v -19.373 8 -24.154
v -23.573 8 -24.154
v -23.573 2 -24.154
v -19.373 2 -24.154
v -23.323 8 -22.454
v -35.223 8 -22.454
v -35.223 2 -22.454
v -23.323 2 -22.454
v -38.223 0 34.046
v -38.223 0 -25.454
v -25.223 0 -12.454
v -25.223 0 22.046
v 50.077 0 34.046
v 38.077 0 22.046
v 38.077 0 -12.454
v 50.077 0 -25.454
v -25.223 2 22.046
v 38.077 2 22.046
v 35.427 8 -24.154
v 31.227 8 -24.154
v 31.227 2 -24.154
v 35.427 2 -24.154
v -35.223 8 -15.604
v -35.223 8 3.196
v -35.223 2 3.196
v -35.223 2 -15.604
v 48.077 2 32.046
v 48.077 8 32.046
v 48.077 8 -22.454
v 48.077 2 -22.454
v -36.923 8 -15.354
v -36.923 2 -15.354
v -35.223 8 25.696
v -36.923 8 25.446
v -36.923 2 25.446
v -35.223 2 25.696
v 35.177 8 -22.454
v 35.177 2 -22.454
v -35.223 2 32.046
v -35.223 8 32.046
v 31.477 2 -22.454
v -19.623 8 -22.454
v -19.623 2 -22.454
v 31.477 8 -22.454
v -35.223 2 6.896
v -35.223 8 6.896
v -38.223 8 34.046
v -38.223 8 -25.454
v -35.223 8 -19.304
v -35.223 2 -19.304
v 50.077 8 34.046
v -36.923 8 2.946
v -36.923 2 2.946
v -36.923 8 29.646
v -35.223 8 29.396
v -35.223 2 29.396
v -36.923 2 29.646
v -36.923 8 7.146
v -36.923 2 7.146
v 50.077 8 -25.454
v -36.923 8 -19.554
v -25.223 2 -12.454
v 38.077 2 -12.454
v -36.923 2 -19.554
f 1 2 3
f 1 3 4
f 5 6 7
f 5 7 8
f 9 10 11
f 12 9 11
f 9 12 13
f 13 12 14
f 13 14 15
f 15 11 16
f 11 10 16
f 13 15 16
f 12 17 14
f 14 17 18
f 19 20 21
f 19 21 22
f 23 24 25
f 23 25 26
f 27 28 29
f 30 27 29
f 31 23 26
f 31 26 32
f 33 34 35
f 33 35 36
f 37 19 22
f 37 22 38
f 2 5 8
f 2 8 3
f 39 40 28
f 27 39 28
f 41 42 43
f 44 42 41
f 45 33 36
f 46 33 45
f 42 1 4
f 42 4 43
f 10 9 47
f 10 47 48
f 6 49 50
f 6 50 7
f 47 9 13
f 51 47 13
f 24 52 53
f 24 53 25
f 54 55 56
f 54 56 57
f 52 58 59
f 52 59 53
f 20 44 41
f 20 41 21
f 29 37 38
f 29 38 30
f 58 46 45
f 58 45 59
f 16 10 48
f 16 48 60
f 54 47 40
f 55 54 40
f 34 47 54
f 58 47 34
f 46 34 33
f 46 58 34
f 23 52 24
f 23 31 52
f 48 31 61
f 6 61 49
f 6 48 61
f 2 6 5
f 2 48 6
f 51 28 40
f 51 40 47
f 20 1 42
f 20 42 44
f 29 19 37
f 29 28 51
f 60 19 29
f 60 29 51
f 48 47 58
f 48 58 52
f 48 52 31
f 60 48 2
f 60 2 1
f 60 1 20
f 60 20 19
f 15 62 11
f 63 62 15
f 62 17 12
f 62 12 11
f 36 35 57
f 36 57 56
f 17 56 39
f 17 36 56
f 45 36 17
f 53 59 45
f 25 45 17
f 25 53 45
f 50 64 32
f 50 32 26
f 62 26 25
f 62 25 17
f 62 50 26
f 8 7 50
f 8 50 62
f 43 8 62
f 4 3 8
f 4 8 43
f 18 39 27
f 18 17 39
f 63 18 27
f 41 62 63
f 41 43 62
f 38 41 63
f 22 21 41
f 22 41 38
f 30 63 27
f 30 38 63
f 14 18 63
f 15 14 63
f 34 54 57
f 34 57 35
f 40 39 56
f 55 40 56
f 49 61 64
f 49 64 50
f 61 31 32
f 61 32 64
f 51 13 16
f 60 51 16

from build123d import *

# Parameters (mm, degrees)
SKETCH1_W           = 88.3
SKETCH1_H           = 59.5
BOSS_EXTRUDE1_DEPTH = 8
SKETCH2_W           = 83.3
SKETCH2_H           = 54.5
CUT_EXTRUDE1_DEPTH  = 6
CUT_EXTRUDE2_DEPTH  = 6
SKETCH4_W           = 63.3
SKETCH4_H           = 34.5
CUT_EXTRUDE3_DEPTH  = 3


with BuildPart() as part:
    # Sketch1 → Boss-Extrude1 (new body)
    with BuildSketch(Plane(origin=(0, 0, 0), x_dir=(1, 0, 0), z_dir=(0, 1, 0))):
        with Locations((5.926671878, -4.296406043)):
            Rectangle(SKETCH1_W, SKETCH1_H)
    extrude(amount=BOSS_EXTRUDE1_DEPTH)

    # Sketch2 → Cut-Extrude1 (cut)
    with BuildSketch(Plane(origin=(0, 8, 0), x_dir=(1, 0, 0), z_dir=(0, 1, 0))):
        with Locations((6.426671878, -4.796406043)):
            Rectangle(SKETCH2_W, SKETCH2_H)
    extrude(amount=-CUT_EXTRUDE1_DEPTH, mode=Mode.SUBTRACT)

    # Sketch3 → Cut-Extrude2 (cut)
    with BuildSketch(Plane(origin=(0, 8, 0), x_dir=(1, 0, 0), z_dir=(0, 1, 0))):
        Polygon((-35.223328122, -29.396406043), (-36.923328122, -29.646406043), (-36.923328122, -25.446406043), (-35.223328122, -25.696406043), align=None)
        Polygon((-35.223328122, -6.896406043), (-36.923328122, -7.146406043), (-36.923328122, -2.946406043), (-35.223328122, -3.196406043), align=None)
        Polygon((-35.223328122, 15.603593957), (-36.923328122, 15.353593957), (-36.923328122, 19.553593957), (-35.223328122, 19.303593957), align=None)
        Polygon((35.176671878, 22.453593957), (31.476671878, 22.453593957), (31.226671878, 24.153593957), (35.426671878, 24.153593957), align=None)
        Polygon((-23.323328122, 22.453593957), (-23.573328122, 24.153593957), (-19.373328122, 24.153593957), (-19.623328122, 22.453593957), align=None)
    extrude(amount=-CUT_EXTRUDE2_DEPTH, mode=Mode.SUBTRACT)

    # Sketch4 → Cut-Extrude3 (cut, through all)
    with BuildSketch(Plane(origin=(0, 2, 0), x_dir=(1, 0, 0), z_dir=(0, 1, 0))):
        with Locations((6.426671878, -4.796406043)):
            Rectangle(SKETCH4_W, SKETCH4_H)
    extrude(amount=-CUT_EXTRUDE3_DEPTH, mode=Mode.SUBTRACT)


solid = part.part
